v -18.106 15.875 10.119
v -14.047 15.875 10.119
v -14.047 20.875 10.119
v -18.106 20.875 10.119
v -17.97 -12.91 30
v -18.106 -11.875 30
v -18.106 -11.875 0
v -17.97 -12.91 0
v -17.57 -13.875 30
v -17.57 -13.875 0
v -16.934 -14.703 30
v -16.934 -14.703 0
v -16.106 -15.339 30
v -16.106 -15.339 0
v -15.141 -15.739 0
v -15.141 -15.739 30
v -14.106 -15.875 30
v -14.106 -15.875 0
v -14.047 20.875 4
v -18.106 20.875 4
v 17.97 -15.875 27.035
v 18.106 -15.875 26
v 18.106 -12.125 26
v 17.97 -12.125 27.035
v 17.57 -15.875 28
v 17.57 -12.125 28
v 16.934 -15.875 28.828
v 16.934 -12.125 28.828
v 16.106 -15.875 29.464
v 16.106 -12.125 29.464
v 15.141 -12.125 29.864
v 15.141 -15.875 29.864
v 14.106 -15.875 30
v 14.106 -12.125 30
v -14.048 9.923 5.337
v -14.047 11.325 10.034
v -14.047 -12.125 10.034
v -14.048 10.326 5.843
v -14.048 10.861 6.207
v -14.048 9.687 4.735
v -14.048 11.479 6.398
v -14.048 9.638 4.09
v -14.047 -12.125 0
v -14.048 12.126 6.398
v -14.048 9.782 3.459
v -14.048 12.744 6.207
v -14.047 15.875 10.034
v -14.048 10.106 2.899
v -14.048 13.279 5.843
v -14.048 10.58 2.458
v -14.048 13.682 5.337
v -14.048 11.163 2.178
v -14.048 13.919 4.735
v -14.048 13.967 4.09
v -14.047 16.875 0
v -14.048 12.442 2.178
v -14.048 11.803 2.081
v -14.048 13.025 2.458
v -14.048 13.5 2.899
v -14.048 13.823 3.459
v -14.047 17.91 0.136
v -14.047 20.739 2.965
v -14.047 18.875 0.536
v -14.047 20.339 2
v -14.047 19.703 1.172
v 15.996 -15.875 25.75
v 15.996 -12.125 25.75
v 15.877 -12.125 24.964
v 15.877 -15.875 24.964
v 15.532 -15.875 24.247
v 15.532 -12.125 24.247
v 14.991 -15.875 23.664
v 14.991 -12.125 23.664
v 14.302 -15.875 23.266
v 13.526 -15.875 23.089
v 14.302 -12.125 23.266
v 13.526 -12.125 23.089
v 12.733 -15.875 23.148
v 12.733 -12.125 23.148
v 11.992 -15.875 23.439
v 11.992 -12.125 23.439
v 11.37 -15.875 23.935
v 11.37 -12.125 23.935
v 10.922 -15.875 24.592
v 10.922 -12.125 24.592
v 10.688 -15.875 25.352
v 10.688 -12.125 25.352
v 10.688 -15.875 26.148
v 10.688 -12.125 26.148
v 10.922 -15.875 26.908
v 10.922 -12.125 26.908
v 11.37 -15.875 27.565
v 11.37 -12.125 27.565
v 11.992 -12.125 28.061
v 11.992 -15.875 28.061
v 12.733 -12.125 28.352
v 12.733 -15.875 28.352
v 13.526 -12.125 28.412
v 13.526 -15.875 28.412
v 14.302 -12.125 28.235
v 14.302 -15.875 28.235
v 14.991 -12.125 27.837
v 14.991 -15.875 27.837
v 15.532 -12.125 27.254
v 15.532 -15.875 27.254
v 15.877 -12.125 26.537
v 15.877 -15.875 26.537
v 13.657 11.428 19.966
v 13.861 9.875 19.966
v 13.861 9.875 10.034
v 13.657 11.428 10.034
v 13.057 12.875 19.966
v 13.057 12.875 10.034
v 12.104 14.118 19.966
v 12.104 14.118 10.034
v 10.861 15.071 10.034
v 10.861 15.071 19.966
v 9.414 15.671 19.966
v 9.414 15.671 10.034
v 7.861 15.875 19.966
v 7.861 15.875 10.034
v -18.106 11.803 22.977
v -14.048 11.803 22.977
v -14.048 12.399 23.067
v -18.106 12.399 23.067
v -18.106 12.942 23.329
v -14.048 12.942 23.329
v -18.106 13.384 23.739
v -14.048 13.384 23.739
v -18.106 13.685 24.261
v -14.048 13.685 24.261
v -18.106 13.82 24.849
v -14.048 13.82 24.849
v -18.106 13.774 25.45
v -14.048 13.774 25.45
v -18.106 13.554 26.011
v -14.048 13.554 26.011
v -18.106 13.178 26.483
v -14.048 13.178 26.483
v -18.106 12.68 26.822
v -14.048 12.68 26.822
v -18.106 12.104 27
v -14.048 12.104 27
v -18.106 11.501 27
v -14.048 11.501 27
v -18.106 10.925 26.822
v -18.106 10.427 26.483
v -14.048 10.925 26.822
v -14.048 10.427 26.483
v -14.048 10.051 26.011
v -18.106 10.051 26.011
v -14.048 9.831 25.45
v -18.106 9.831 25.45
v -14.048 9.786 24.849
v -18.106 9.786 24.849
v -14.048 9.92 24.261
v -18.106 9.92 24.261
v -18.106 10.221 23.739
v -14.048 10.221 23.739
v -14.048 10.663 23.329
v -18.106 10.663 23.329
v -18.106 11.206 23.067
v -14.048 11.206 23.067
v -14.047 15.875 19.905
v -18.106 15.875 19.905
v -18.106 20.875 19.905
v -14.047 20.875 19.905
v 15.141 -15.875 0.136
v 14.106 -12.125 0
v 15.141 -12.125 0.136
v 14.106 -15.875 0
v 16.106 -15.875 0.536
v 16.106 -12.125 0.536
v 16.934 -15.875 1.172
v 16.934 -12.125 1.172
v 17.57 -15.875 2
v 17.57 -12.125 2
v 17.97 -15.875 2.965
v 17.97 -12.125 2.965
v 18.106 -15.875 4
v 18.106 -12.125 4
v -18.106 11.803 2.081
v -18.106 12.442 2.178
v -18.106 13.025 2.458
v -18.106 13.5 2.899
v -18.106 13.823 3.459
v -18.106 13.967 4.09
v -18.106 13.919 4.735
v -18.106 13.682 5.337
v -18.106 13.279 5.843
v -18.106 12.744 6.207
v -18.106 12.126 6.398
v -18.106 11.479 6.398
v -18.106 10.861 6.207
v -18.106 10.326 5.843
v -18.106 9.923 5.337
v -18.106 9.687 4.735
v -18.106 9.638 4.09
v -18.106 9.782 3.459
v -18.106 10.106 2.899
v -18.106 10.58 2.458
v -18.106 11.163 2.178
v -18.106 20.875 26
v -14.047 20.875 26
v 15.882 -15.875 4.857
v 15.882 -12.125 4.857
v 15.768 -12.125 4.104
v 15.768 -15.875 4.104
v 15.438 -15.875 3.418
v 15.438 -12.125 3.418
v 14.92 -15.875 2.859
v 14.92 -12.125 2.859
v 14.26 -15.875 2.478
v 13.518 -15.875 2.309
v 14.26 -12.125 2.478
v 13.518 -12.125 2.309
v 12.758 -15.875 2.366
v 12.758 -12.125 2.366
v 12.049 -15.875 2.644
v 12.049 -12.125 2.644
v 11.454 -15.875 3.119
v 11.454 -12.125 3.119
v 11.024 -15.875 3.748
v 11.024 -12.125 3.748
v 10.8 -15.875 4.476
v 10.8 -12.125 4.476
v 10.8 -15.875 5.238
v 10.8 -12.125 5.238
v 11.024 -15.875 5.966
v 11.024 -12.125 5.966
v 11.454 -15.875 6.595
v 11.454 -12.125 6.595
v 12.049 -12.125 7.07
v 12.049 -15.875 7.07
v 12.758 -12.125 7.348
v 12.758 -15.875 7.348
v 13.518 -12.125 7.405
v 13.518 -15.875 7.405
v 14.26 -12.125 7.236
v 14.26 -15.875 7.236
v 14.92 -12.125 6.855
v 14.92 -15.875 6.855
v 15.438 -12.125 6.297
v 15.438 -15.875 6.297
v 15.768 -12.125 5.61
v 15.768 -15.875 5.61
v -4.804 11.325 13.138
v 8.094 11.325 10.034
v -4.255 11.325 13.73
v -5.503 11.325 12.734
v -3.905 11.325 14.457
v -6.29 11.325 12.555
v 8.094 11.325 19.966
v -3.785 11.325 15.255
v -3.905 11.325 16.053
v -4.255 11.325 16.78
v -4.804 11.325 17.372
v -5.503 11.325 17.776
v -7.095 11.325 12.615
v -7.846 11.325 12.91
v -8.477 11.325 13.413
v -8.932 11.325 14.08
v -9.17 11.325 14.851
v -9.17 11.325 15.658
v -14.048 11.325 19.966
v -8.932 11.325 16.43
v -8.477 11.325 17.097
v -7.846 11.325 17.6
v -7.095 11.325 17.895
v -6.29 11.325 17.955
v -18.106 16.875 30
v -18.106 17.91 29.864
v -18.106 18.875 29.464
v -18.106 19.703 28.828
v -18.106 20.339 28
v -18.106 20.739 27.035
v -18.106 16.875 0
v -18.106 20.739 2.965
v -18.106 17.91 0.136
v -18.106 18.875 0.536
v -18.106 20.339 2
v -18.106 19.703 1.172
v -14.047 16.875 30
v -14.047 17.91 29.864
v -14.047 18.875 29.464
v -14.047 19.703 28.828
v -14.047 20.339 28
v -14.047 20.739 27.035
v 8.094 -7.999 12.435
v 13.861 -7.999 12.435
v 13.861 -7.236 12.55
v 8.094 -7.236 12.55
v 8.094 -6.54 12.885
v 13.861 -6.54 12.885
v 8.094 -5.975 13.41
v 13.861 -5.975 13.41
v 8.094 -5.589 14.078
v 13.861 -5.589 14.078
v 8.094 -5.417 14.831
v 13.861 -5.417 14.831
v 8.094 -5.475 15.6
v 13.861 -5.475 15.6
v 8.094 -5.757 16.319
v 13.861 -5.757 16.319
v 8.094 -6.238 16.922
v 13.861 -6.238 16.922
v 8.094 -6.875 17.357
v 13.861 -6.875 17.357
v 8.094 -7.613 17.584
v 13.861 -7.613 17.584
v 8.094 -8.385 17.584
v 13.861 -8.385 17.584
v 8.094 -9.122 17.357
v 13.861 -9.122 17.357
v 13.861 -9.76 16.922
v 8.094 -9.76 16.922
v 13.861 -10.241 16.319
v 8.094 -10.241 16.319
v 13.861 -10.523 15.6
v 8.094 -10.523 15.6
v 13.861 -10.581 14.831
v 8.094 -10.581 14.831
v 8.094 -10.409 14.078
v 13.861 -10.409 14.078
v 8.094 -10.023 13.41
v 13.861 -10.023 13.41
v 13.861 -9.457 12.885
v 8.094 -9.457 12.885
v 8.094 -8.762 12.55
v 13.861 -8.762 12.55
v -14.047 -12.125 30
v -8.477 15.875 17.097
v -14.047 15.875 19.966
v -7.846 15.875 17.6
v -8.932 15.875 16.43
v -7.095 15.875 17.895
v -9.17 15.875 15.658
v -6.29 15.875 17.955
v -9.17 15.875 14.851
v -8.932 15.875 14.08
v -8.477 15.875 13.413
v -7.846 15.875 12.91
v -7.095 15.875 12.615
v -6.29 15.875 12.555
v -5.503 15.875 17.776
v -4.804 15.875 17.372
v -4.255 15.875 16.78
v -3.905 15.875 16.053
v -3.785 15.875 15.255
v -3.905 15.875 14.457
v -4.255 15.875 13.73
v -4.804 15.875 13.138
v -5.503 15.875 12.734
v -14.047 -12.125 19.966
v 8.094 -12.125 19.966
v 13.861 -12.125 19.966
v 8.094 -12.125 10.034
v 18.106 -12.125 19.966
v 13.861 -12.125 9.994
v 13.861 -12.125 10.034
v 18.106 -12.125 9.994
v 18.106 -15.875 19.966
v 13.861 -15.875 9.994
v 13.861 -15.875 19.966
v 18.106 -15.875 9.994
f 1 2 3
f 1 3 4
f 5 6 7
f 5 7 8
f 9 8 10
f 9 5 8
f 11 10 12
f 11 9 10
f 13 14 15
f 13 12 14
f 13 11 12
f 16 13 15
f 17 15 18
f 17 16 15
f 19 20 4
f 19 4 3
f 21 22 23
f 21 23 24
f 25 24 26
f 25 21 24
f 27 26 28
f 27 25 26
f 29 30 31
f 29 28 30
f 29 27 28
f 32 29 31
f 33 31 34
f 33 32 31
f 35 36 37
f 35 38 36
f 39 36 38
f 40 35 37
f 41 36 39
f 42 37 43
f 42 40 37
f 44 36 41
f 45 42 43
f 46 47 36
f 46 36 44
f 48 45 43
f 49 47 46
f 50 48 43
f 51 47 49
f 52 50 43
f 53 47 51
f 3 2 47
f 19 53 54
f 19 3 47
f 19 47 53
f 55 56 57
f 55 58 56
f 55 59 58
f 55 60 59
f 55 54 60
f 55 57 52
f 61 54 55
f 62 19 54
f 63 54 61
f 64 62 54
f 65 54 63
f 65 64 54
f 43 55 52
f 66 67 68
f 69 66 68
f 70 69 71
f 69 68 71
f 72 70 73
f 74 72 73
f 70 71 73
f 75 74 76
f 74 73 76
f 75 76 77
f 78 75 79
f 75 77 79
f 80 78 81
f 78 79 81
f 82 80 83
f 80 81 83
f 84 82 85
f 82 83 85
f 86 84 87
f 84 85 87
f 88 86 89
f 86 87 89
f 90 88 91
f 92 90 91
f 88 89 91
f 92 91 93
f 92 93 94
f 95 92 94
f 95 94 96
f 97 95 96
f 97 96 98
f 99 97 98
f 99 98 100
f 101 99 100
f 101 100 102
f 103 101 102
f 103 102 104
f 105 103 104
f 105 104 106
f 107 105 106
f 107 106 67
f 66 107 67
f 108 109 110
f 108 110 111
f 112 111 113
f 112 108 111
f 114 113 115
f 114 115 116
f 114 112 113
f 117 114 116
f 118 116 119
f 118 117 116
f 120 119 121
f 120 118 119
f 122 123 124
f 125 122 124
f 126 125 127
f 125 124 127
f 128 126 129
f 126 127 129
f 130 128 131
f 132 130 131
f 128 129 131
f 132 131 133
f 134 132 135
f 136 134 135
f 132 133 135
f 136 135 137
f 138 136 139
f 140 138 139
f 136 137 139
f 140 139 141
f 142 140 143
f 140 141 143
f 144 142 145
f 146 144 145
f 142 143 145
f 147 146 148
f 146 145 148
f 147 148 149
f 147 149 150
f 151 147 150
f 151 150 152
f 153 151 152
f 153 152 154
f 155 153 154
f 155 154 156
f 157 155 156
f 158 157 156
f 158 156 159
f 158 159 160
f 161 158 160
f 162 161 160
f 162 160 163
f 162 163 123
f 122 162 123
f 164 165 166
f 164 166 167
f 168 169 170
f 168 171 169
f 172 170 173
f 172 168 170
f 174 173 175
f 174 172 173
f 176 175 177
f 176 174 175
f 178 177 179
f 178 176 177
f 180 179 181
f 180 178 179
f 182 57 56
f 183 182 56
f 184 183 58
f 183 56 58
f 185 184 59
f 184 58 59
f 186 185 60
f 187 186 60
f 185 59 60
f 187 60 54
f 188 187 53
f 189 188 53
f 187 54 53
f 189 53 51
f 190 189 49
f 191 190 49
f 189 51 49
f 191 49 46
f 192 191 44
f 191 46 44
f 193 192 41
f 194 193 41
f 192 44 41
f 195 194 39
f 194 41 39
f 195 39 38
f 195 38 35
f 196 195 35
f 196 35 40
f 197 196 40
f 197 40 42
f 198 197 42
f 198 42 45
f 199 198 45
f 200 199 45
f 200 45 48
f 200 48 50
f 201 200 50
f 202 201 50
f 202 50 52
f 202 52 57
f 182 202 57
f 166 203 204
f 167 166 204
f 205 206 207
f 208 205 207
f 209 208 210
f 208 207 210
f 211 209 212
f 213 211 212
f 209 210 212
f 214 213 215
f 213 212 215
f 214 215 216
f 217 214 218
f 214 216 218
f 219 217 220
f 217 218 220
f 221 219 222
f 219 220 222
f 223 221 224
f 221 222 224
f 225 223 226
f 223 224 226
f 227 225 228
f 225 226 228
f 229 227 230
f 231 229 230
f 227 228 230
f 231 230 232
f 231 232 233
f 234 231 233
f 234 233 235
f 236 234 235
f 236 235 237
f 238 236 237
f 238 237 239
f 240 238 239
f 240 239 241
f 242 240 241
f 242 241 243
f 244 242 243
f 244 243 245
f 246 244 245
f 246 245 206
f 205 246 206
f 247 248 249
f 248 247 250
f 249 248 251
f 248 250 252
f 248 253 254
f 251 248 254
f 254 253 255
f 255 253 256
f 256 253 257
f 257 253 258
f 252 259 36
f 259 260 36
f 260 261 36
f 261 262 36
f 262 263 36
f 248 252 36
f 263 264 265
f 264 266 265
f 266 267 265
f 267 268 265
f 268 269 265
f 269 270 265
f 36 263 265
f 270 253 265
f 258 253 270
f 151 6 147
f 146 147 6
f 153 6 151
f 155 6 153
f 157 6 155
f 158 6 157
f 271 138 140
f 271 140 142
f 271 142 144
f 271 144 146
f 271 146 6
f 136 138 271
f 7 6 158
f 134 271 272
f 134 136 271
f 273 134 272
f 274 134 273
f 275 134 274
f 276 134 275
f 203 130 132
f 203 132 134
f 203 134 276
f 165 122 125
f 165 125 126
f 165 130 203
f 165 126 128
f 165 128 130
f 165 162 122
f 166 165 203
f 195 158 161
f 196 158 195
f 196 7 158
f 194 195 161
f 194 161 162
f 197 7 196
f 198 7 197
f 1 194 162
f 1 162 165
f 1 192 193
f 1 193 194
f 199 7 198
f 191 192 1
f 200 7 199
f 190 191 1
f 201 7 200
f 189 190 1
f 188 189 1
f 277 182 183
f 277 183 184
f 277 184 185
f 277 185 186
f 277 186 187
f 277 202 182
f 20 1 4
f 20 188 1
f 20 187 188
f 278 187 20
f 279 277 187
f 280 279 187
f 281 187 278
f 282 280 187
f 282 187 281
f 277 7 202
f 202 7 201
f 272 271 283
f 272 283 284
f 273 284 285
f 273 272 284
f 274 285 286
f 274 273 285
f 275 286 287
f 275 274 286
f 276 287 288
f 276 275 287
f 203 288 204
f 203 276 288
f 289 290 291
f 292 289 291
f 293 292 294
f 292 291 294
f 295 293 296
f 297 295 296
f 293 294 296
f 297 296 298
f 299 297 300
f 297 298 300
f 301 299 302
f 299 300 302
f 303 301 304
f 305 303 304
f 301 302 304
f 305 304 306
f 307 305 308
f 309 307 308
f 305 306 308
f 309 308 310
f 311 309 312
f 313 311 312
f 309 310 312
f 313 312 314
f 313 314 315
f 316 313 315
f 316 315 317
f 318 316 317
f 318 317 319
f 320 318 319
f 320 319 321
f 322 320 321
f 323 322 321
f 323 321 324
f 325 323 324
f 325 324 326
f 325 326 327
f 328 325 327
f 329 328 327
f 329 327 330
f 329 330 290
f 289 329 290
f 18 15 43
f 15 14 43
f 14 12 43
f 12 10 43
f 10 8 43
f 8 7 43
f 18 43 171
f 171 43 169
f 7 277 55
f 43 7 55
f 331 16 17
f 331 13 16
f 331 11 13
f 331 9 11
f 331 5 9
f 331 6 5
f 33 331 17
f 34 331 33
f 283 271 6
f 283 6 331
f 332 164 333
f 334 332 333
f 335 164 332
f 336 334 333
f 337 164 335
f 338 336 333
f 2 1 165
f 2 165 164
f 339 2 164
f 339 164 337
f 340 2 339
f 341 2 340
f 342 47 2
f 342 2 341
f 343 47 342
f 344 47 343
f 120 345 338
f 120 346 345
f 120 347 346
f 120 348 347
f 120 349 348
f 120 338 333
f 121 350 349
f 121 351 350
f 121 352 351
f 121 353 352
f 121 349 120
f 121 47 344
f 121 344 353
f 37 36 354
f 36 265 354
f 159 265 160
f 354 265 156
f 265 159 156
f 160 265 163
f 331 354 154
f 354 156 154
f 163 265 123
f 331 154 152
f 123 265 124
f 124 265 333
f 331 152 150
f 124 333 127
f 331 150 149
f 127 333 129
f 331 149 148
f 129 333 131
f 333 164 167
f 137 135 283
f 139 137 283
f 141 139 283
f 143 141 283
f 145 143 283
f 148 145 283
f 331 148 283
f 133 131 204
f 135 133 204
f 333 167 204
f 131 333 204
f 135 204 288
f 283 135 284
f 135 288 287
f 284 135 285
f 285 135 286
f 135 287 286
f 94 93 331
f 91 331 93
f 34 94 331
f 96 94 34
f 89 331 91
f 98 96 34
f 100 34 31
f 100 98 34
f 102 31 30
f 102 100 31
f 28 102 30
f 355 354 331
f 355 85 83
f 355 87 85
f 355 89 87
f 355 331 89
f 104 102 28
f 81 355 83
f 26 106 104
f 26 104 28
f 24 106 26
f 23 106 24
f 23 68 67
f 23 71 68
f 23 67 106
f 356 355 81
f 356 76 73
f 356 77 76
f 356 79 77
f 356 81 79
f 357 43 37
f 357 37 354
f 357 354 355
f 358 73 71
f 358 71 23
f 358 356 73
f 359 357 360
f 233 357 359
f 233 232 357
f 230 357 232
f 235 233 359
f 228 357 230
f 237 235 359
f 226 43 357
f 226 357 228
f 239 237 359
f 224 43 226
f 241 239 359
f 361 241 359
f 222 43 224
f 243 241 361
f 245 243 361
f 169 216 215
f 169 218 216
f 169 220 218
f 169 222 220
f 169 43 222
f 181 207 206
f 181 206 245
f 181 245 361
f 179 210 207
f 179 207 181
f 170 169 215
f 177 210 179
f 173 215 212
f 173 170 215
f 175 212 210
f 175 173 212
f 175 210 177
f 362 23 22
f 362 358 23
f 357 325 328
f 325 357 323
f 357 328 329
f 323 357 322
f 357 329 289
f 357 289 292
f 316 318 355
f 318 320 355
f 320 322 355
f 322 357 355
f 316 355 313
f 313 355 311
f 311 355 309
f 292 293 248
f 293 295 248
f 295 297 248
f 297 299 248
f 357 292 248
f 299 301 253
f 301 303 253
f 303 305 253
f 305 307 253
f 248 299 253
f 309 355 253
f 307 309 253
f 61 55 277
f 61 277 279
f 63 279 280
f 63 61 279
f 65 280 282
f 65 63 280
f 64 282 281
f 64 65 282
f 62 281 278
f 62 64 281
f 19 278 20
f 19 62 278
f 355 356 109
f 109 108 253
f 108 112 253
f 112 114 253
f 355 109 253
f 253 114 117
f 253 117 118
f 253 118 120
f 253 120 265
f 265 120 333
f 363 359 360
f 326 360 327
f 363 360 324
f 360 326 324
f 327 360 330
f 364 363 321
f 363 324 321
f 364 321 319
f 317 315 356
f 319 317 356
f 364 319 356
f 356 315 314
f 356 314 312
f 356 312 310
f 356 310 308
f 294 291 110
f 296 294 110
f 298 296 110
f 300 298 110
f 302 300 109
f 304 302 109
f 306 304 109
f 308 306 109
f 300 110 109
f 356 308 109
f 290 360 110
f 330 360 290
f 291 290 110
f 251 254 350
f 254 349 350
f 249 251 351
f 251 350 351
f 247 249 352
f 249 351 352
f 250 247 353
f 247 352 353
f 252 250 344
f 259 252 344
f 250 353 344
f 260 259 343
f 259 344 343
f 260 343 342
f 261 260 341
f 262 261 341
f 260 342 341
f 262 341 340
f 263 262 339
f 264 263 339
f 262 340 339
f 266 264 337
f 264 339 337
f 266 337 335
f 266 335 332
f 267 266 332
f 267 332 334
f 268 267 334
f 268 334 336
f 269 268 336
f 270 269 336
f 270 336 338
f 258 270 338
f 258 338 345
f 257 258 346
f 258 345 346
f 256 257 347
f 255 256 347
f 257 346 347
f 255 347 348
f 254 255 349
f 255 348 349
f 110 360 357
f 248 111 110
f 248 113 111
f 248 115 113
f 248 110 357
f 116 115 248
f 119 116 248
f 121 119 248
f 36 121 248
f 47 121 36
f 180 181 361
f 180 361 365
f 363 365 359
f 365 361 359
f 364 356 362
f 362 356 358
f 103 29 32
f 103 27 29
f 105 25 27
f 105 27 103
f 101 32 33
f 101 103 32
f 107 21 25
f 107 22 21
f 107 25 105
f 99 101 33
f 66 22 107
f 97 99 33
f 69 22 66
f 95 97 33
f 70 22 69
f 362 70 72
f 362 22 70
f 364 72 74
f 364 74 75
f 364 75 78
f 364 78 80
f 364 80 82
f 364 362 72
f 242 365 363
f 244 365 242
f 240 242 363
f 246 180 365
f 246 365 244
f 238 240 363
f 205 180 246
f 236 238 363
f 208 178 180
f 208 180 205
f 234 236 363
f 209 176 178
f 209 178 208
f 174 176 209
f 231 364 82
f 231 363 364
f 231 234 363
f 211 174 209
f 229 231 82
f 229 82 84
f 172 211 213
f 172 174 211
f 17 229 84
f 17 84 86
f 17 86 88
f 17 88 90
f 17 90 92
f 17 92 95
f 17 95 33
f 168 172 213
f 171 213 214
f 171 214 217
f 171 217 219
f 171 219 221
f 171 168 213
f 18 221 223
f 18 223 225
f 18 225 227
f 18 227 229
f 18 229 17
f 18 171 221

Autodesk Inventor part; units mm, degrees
ref_plane "YZ Plane" through (0, 0, 0) normal (1, 0, 0) x (0, 1, 0)
ref_plane "XZ Plane" through (0, 0, 0) normal (0, 1, 0) x (-1, 0, 0)
ref_plane "XY Plane" through (0, 0, 0) normal (0, 0, 1) x (1, 0, 0)
sketch "스케치1" plane through (0, 0, 0) normal (0, 0, 1) x (1, 0, 0)
  line L0 (18.1059, -15.875) -> (-18.1059, -15.875)
  line L1 (-18.1059, -15.875) -> (-18.1059, 15.875)
  line L2 (-18.1059, 15.875) -> (18.1059, 15.875)
  line L3 (18.1059, 15.875) -> (18.1059, -15.875)
  line L4 (18.1059, -15.875) -> (-18.1059, 15.875) construction
  line L5 (-18.1059, -15.875) -> (18.1059, 15.875) construction
  point P0 (0, 0)
extrude "돌출1" add sketch "스케치1" along normal blind 30
sketch "스케치2" plane through (-18.1059, 15.875, 0) normal (0, 1, 0) x (1, 0, 0)
  line L0 (0, -30) -> (36.2119, -30) projected
  line L1 (36.2119, 0) -> (36.2119, -30) projected
  line L2 (4.0585, -30) -> (36.2119, -30)
  line L3 (36.2119, -30) -> (36.2119, -19.9659)
  line L4 (36.2119, -19.9659) -> (4.0585, -19.9659)
  line L5 (4.0585, -19.9659) -> (4.0585, -30)
  line L6 (36.2119, 0) -> (0, 0) projected
  line L7 (4.0585, 0) -> (36.2119, 0)
  line L8 (36.2119, 0) -> (36.2119, -10.034)
  line L9 (36.2119, -10.034) -> (4.0585, -10.034)
  line L10 (4.0585, -10.034) -> (4.0585, 0)
  point P0 (18.1059, 0)
  dimension "d2" = 10.034
extrude "돌출2" cut sketch "스케치2" against normal blind 28
sketch "스케치3" plane through (-18.1059, 15.875, 30) normal (0, 1, 0) x (1, 0, 0)
  line L0 (4.0585, 10.0341) -> (36.2119, 10.0341) projected
  line L1 (36.2119, 30) -> (36.2119, 0) projected
  line L2 (31.9669, 10.0341) -> (36.2119, 10.0341)
  line L3 (36.2119, 10.0341) -> (36.2119, 20.0064)
  line L4 (36.2119, 20.0064) -> (31.9669, 20.0064)
  line L5 (31.9669, 20.0064) -> (31.9669, 10.0341)
  point P0 (18.1059, 30)
extrude "돌출3" cut sketch "스케치3" against normal blind 50
sketch "스케치4" plane through (-14.0475, -12.125, 19.9659) normal (0, 0, 1) x (1, 0, 0)
  line L0 (0, 0) -> (22.1415, 0)
  line L1 (22.1415, 0) -> (22.1415, 23.4499)
  line L2 (22.1415, 23.4499) -> (0, 23.4499)
  line L3 (0, 23.4499) -> (0, 0)
  point P0 (14.0475, 12.125)
extrude "돌출4" cut sketch "스케치4" against normal blind 50
sketch "스케치5" plane through (-14.0475, 15.875, 30) normal (1, 0, 0) x (0, 0, -1)
  circle A0 centre (5.0001, -4.0724) radius 2.0226
  circle A1 centre (25.7482, -4.0724) radius 2.1705
  point P0 (30, -15.875)
extrude "돌출5" cut sketch "스케치5" against normal blind 50
sketch "스케치6" plane through (-18.1059, -12.125, 0) normal (0, 1, 0) x (1, 0, 0)
  circle A0 centre (31.4326, -4.8571) radius 2.5553
  circle A1 centre (31.4326, -25.7502) radius 2.6688
  point P0 (18.1059, 0)
extrude "돌출6" cut sketch "스케치6" against normal blind 50
sketch "스케치7" plane through (-18.1059, 15.875, 30) normal (0, 1, 0) x (1, 0, 0)
  circle A0 centre (11.6135, 14.7451) radius 2.7078
  point P0 (18.1059, 30)
extrude "돌출7" cut sketch "스케치7" against normal blind 20
sketch "스케치8" plane through (13.861, 15.875, 19.9659) normal (1, 0, 0) x (0, 0, -1)
  circle A0 centre (4.9416, -23.8738) radius 2.5891
  point P0 (19.9659, -15.875)
extrude "돌출8" cut sketch "스케치8" against normal blind 20
fillet "모깎기1" radius 6 1 edges at (13.861, 15.875, 15)
sketch "스케치9" plane through (-14.0475, 15.875, 19.9659) normal (0, 1, 0) x (1, 0, 0)
  line L0 (-4.0585, 19.9659) -> (-4.0585, -10.0341) projected
  line L1 (-4.0585, 9.9335) -> (21.8906, 9.9335)
  line L2 (21.8906, 9.9335) -> (21.8906, -0.0015)
  line L3 (21.8906, -0.0015) -> (-4.0585, -0.0015)
  line L4 (-4.0585, -0.0015) -> (-4.0585, 9.9335)
  point P0 (14.0475, 19.9659)
  point P1 (-4.0585, 15.9659)
  point P2 (-4.0585, -6.0341)
sketch "스케치10" plane through (-14.0475, 15.875, 19.9659) normal (0, 1, 0) x (1, 0, 0)
  point P0 (14.0475, 19.9659)
sketch "스케치11" plane through (-18.1059, 15.875, 30) normal (0, 1, 0) x (1, 0, 0)
  line L0 (0, 30) -> (0, 0) projected
  line L1 (4.0585, 0) -> (4.0585, 30) projected
  line L2 (0, 30) -> (4.0585, 30)
  line L3 (4.0585, 30) -> (4.0585, 19.8806)
  line L4 (4.0585, 19.8806) -> (0, 19.8806)
  line L5 (0, 19.8806) -> (0, 30)
  line L6 (36.2119, 0) -> (4.0585, 0) projected
  line L7 (0, 10.0954) -> (4.0585, 10.0954)
  line L8 (4.0585, 10.0954) -> (4.0585, 0)
  line L9 (4.0585, 0) -> (0, 0)
  line L10 (0, 0) -> (0, 10.0954)
  point P0 (18.1059, 30)
extrude "돌출9" add sketch "스케치11" along normal blind 5 contours L2 L1 L4 L0 | L7 L1 L9 L0
fillet "모깎기3" radius 4 5 edges at (-16.0767, 20.875, 30) (-16.0767, 20.875, 0) (18.1059, -14, 30) (18.1059, -14, 0) (-18.1059, -15.875, 15)
properties part number "240510_3Dsketch04"
